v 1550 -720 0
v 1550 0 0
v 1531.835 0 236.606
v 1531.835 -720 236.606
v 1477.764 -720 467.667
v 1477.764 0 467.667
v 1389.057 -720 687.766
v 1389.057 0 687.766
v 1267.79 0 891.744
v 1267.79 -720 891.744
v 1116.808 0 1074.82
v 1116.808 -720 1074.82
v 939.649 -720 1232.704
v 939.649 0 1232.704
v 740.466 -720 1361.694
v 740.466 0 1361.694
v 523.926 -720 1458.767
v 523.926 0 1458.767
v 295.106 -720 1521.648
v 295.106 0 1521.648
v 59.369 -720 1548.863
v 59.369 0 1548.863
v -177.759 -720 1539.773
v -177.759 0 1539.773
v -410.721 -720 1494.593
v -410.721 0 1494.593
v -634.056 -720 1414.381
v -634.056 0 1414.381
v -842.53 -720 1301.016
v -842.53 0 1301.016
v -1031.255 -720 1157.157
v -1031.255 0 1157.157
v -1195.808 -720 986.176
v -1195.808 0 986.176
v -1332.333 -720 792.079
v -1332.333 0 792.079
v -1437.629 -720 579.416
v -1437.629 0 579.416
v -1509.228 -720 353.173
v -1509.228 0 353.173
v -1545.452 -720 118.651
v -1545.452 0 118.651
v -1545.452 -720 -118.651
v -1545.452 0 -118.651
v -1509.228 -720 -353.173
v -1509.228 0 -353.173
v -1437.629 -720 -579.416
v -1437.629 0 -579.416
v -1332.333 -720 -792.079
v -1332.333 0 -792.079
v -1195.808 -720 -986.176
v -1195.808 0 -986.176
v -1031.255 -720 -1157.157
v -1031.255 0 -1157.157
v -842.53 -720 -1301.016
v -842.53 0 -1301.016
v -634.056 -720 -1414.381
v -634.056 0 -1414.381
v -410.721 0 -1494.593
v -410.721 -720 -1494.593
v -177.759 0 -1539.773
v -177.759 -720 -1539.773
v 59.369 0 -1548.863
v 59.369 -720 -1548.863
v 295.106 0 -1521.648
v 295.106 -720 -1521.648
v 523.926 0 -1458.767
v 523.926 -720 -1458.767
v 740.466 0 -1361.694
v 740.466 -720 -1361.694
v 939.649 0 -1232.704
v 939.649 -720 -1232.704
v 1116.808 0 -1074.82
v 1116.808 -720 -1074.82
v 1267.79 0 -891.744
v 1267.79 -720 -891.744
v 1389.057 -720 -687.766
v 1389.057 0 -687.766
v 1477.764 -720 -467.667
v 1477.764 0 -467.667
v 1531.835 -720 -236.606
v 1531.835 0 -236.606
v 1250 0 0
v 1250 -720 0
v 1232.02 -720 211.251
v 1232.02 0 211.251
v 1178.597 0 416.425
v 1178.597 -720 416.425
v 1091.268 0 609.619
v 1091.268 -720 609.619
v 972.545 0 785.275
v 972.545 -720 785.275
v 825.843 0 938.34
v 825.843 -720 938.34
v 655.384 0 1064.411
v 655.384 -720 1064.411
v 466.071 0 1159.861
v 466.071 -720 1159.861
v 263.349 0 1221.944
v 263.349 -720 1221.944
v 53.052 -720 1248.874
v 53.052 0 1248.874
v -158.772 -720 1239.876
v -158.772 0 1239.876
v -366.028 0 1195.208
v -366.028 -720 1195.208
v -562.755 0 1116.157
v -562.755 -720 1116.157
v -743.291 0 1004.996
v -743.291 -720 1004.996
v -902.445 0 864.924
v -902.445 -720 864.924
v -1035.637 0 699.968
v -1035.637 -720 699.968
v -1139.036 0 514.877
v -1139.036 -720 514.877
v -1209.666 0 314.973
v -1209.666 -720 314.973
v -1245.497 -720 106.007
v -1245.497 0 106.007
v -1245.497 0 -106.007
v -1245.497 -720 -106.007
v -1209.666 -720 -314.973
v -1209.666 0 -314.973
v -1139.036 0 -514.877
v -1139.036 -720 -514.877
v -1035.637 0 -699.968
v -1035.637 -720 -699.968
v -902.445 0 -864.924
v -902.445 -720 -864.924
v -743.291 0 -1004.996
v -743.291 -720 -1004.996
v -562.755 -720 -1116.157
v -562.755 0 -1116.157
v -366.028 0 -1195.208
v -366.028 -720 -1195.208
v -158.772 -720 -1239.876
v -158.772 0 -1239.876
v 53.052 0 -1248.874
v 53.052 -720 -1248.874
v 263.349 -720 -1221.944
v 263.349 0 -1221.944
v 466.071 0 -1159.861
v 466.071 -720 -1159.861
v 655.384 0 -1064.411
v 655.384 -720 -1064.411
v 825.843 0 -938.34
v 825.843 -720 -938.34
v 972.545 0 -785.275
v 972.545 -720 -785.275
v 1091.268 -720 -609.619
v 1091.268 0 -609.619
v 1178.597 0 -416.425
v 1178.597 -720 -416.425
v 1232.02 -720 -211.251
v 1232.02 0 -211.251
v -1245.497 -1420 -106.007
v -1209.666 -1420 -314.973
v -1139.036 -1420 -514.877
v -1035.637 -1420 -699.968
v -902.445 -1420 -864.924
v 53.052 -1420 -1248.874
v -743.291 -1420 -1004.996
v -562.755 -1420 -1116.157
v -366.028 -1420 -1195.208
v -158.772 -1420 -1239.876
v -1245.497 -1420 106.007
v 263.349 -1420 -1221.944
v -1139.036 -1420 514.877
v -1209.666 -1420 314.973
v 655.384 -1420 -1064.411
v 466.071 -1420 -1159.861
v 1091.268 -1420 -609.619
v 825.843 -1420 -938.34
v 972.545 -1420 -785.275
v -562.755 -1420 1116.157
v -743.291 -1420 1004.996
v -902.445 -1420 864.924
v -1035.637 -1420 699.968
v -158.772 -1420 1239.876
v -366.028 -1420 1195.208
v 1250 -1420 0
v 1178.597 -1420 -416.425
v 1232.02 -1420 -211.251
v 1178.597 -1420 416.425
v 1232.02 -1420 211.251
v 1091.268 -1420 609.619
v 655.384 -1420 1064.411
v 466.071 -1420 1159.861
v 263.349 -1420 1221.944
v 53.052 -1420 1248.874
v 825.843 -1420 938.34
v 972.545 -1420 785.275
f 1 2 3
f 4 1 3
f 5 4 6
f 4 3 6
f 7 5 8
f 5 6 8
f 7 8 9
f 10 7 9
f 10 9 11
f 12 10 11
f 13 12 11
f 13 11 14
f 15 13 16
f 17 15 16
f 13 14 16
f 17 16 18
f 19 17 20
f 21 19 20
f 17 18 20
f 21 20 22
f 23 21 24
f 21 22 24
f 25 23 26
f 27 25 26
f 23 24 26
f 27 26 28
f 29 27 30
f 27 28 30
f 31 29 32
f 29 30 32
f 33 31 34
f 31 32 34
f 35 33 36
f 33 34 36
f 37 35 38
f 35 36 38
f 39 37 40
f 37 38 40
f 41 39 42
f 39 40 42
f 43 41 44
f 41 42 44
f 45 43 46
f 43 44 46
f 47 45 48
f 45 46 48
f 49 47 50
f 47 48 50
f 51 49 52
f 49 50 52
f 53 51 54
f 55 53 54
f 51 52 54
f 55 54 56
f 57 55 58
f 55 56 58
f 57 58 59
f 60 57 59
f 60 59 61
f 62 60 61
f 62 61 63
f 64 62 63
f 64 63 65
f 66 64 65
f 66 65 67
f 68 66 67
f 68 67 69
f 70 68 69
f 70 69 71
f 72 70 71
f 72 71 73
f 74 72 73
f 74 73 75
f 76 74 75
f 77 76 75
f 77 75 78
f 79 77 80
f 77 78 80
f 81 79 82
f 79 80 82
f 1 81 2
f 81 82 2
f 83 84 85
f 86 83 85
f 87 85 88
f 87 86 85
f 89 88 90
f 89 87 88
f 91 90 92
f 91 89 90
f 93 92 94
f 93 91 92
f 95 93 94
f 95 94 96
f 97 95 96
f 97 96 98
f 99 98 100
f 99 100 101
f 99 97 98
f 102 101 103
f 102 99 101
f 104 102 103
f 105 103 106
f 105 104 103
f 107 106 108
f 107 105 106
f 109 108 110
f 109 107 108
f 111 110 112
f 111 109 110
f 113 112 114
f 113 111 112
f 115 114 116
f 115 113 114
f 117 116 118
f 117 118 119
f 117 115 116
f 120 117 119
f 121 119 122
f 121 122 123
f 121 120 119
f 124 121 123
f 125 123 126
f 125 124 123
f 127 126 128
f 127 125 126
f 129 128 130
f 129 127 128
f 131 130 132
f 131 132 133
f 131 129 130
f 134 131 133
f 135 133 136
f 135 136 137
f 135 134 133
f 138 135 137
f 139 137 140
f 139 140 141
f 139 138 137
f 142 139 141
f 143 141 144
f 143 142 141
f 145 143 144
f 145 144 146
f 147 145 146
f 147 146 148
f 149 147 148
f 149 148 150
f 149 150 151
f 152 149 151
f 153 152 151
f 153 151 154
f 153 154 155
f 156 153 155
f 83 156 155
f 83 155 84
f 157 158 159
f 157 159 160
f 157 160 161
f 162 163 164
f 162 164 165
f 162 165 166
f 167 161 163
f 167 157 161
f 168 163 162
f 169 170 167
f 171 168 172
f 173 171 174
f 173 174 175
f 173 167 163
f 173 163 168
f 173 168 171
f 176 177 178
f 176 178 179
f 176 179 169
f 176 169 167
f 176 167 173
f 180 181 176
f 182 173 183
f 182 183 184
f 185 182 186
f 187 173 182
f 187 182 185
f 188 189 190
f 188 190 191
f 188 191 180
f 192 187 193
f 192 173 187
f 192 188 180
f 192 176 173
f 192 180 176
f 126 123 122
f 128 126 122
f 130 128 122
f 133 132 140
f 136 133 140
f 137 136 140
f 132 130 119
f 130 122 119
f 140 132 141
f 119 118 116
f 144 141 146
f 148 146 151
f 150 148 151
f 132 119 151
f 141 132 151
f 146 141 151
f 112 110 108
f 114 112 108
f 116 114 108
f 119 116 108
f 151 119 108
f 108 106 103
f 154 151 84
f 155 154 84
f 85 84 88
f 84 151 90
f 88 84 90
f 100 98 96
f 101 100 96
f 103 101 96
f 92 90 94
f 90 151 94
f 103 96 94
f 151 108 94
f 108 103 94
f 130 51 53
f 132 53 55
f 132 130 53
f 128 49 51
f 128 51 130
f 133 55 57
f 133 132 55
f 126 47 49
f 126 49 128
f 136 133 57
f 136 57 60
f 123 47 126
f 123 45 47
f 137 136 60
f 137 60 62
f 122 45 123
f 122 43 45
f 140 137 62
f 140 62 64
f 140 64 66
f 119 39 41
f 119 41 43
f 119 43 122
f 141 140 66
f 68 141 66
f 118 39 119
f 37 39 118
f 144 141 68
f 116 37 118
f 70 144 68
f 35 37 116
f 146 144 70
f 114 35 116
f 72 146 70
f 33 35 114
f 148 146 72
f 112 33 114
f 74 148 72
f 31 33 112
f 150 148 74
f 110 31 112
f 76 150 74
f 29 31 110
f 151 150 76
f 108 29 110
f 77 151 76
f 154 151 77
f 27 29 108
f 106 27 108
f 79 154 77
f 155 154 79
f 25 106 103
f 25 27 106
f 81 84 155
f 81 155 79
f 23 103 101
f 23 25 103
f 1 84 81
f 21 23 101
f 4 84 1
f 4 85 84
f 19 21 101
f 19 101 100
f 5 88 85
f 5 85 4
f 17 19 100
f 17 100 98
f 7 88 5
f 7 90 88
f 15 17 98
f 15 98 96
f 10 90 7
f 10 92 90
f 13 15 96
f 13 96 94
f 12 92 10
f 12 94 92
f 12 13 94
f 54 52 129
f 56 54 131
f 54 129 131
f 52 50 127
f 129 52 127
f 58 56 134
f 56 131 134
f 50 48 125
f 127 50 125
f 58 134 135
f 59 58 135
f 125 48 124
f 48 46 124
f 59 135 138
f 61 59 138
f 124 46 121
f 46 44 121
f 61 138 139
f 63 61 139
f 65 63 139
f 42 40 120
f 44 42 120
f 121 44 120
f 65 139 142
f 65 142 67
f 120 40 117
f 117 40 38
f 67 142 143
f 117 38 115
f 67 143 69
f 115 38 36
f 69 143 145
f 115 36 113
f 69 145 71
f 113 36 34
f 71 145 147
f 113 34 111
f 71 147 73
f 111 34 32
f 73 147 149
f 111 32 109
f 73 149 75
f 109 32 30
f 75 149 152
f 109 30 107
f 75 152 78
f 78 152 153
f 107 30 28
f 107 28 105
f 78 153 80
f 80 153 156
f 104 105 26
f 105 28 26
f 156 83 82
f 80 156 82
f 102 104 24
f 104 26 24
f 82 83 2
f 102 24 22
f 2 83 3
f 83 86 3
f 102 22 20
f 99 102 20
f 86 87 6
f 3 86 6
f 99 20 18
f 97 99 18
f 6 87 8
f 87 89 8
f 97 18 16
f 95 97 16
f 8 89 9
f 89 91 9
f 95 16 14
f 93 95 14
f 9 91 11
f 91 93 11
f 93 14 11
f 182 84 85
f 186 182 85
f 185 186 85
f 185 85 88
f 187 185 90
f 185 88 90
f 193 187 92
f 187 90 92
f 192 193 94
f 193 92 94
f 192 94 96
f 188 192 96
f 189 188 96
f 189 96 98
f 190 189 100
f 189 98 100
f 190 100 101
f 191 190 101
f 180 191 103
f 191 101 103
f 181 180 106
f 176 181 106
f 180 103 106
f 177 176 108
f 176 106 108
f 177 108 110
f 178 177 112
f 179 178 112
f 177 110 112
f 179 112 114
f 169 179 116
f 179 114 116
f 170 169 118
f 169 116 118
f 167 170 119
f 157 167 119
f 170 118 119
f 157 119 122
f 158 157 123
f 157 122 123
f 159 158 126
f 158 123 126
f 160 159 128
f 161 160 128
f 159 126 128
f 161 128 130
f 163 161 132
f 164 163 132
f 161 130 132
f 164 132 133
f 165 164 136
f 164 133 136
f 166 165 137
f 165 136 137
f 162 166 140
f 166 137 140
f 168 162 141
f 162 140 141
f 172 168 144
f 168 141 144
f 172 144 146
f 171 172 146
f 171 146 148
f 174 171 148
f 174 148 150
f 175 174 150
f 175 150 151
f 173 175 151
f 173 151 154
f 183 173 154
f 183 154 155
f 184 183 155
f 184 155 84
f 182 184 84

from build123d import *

# Parameters (mm, degrees)
F0_R     = 1549.999952
F0_R_2   = 1250
F1_DEPTH = 720
F2_R     = 1250
F3_DEPTH = 700


with BuildPart() as f1:
    # F0 (on Front) → F1 (new body)
    with BuildSketch(Plane.XZ):
        Circle(F0_R)
        Circle(F0_R_2, mode=Mode.SUBTRACT)
    extrude(amount=F1_DEPTH)


with BuildPart() as f3:
    # F2 (on face) → F3 (new body)
    with BuildSketch(Plane.XZ.offset(720)):
        Circle(F2_R)
    extrude(amount=F3_DEPTH)


solid = Compound([f1.part, f3.part])
